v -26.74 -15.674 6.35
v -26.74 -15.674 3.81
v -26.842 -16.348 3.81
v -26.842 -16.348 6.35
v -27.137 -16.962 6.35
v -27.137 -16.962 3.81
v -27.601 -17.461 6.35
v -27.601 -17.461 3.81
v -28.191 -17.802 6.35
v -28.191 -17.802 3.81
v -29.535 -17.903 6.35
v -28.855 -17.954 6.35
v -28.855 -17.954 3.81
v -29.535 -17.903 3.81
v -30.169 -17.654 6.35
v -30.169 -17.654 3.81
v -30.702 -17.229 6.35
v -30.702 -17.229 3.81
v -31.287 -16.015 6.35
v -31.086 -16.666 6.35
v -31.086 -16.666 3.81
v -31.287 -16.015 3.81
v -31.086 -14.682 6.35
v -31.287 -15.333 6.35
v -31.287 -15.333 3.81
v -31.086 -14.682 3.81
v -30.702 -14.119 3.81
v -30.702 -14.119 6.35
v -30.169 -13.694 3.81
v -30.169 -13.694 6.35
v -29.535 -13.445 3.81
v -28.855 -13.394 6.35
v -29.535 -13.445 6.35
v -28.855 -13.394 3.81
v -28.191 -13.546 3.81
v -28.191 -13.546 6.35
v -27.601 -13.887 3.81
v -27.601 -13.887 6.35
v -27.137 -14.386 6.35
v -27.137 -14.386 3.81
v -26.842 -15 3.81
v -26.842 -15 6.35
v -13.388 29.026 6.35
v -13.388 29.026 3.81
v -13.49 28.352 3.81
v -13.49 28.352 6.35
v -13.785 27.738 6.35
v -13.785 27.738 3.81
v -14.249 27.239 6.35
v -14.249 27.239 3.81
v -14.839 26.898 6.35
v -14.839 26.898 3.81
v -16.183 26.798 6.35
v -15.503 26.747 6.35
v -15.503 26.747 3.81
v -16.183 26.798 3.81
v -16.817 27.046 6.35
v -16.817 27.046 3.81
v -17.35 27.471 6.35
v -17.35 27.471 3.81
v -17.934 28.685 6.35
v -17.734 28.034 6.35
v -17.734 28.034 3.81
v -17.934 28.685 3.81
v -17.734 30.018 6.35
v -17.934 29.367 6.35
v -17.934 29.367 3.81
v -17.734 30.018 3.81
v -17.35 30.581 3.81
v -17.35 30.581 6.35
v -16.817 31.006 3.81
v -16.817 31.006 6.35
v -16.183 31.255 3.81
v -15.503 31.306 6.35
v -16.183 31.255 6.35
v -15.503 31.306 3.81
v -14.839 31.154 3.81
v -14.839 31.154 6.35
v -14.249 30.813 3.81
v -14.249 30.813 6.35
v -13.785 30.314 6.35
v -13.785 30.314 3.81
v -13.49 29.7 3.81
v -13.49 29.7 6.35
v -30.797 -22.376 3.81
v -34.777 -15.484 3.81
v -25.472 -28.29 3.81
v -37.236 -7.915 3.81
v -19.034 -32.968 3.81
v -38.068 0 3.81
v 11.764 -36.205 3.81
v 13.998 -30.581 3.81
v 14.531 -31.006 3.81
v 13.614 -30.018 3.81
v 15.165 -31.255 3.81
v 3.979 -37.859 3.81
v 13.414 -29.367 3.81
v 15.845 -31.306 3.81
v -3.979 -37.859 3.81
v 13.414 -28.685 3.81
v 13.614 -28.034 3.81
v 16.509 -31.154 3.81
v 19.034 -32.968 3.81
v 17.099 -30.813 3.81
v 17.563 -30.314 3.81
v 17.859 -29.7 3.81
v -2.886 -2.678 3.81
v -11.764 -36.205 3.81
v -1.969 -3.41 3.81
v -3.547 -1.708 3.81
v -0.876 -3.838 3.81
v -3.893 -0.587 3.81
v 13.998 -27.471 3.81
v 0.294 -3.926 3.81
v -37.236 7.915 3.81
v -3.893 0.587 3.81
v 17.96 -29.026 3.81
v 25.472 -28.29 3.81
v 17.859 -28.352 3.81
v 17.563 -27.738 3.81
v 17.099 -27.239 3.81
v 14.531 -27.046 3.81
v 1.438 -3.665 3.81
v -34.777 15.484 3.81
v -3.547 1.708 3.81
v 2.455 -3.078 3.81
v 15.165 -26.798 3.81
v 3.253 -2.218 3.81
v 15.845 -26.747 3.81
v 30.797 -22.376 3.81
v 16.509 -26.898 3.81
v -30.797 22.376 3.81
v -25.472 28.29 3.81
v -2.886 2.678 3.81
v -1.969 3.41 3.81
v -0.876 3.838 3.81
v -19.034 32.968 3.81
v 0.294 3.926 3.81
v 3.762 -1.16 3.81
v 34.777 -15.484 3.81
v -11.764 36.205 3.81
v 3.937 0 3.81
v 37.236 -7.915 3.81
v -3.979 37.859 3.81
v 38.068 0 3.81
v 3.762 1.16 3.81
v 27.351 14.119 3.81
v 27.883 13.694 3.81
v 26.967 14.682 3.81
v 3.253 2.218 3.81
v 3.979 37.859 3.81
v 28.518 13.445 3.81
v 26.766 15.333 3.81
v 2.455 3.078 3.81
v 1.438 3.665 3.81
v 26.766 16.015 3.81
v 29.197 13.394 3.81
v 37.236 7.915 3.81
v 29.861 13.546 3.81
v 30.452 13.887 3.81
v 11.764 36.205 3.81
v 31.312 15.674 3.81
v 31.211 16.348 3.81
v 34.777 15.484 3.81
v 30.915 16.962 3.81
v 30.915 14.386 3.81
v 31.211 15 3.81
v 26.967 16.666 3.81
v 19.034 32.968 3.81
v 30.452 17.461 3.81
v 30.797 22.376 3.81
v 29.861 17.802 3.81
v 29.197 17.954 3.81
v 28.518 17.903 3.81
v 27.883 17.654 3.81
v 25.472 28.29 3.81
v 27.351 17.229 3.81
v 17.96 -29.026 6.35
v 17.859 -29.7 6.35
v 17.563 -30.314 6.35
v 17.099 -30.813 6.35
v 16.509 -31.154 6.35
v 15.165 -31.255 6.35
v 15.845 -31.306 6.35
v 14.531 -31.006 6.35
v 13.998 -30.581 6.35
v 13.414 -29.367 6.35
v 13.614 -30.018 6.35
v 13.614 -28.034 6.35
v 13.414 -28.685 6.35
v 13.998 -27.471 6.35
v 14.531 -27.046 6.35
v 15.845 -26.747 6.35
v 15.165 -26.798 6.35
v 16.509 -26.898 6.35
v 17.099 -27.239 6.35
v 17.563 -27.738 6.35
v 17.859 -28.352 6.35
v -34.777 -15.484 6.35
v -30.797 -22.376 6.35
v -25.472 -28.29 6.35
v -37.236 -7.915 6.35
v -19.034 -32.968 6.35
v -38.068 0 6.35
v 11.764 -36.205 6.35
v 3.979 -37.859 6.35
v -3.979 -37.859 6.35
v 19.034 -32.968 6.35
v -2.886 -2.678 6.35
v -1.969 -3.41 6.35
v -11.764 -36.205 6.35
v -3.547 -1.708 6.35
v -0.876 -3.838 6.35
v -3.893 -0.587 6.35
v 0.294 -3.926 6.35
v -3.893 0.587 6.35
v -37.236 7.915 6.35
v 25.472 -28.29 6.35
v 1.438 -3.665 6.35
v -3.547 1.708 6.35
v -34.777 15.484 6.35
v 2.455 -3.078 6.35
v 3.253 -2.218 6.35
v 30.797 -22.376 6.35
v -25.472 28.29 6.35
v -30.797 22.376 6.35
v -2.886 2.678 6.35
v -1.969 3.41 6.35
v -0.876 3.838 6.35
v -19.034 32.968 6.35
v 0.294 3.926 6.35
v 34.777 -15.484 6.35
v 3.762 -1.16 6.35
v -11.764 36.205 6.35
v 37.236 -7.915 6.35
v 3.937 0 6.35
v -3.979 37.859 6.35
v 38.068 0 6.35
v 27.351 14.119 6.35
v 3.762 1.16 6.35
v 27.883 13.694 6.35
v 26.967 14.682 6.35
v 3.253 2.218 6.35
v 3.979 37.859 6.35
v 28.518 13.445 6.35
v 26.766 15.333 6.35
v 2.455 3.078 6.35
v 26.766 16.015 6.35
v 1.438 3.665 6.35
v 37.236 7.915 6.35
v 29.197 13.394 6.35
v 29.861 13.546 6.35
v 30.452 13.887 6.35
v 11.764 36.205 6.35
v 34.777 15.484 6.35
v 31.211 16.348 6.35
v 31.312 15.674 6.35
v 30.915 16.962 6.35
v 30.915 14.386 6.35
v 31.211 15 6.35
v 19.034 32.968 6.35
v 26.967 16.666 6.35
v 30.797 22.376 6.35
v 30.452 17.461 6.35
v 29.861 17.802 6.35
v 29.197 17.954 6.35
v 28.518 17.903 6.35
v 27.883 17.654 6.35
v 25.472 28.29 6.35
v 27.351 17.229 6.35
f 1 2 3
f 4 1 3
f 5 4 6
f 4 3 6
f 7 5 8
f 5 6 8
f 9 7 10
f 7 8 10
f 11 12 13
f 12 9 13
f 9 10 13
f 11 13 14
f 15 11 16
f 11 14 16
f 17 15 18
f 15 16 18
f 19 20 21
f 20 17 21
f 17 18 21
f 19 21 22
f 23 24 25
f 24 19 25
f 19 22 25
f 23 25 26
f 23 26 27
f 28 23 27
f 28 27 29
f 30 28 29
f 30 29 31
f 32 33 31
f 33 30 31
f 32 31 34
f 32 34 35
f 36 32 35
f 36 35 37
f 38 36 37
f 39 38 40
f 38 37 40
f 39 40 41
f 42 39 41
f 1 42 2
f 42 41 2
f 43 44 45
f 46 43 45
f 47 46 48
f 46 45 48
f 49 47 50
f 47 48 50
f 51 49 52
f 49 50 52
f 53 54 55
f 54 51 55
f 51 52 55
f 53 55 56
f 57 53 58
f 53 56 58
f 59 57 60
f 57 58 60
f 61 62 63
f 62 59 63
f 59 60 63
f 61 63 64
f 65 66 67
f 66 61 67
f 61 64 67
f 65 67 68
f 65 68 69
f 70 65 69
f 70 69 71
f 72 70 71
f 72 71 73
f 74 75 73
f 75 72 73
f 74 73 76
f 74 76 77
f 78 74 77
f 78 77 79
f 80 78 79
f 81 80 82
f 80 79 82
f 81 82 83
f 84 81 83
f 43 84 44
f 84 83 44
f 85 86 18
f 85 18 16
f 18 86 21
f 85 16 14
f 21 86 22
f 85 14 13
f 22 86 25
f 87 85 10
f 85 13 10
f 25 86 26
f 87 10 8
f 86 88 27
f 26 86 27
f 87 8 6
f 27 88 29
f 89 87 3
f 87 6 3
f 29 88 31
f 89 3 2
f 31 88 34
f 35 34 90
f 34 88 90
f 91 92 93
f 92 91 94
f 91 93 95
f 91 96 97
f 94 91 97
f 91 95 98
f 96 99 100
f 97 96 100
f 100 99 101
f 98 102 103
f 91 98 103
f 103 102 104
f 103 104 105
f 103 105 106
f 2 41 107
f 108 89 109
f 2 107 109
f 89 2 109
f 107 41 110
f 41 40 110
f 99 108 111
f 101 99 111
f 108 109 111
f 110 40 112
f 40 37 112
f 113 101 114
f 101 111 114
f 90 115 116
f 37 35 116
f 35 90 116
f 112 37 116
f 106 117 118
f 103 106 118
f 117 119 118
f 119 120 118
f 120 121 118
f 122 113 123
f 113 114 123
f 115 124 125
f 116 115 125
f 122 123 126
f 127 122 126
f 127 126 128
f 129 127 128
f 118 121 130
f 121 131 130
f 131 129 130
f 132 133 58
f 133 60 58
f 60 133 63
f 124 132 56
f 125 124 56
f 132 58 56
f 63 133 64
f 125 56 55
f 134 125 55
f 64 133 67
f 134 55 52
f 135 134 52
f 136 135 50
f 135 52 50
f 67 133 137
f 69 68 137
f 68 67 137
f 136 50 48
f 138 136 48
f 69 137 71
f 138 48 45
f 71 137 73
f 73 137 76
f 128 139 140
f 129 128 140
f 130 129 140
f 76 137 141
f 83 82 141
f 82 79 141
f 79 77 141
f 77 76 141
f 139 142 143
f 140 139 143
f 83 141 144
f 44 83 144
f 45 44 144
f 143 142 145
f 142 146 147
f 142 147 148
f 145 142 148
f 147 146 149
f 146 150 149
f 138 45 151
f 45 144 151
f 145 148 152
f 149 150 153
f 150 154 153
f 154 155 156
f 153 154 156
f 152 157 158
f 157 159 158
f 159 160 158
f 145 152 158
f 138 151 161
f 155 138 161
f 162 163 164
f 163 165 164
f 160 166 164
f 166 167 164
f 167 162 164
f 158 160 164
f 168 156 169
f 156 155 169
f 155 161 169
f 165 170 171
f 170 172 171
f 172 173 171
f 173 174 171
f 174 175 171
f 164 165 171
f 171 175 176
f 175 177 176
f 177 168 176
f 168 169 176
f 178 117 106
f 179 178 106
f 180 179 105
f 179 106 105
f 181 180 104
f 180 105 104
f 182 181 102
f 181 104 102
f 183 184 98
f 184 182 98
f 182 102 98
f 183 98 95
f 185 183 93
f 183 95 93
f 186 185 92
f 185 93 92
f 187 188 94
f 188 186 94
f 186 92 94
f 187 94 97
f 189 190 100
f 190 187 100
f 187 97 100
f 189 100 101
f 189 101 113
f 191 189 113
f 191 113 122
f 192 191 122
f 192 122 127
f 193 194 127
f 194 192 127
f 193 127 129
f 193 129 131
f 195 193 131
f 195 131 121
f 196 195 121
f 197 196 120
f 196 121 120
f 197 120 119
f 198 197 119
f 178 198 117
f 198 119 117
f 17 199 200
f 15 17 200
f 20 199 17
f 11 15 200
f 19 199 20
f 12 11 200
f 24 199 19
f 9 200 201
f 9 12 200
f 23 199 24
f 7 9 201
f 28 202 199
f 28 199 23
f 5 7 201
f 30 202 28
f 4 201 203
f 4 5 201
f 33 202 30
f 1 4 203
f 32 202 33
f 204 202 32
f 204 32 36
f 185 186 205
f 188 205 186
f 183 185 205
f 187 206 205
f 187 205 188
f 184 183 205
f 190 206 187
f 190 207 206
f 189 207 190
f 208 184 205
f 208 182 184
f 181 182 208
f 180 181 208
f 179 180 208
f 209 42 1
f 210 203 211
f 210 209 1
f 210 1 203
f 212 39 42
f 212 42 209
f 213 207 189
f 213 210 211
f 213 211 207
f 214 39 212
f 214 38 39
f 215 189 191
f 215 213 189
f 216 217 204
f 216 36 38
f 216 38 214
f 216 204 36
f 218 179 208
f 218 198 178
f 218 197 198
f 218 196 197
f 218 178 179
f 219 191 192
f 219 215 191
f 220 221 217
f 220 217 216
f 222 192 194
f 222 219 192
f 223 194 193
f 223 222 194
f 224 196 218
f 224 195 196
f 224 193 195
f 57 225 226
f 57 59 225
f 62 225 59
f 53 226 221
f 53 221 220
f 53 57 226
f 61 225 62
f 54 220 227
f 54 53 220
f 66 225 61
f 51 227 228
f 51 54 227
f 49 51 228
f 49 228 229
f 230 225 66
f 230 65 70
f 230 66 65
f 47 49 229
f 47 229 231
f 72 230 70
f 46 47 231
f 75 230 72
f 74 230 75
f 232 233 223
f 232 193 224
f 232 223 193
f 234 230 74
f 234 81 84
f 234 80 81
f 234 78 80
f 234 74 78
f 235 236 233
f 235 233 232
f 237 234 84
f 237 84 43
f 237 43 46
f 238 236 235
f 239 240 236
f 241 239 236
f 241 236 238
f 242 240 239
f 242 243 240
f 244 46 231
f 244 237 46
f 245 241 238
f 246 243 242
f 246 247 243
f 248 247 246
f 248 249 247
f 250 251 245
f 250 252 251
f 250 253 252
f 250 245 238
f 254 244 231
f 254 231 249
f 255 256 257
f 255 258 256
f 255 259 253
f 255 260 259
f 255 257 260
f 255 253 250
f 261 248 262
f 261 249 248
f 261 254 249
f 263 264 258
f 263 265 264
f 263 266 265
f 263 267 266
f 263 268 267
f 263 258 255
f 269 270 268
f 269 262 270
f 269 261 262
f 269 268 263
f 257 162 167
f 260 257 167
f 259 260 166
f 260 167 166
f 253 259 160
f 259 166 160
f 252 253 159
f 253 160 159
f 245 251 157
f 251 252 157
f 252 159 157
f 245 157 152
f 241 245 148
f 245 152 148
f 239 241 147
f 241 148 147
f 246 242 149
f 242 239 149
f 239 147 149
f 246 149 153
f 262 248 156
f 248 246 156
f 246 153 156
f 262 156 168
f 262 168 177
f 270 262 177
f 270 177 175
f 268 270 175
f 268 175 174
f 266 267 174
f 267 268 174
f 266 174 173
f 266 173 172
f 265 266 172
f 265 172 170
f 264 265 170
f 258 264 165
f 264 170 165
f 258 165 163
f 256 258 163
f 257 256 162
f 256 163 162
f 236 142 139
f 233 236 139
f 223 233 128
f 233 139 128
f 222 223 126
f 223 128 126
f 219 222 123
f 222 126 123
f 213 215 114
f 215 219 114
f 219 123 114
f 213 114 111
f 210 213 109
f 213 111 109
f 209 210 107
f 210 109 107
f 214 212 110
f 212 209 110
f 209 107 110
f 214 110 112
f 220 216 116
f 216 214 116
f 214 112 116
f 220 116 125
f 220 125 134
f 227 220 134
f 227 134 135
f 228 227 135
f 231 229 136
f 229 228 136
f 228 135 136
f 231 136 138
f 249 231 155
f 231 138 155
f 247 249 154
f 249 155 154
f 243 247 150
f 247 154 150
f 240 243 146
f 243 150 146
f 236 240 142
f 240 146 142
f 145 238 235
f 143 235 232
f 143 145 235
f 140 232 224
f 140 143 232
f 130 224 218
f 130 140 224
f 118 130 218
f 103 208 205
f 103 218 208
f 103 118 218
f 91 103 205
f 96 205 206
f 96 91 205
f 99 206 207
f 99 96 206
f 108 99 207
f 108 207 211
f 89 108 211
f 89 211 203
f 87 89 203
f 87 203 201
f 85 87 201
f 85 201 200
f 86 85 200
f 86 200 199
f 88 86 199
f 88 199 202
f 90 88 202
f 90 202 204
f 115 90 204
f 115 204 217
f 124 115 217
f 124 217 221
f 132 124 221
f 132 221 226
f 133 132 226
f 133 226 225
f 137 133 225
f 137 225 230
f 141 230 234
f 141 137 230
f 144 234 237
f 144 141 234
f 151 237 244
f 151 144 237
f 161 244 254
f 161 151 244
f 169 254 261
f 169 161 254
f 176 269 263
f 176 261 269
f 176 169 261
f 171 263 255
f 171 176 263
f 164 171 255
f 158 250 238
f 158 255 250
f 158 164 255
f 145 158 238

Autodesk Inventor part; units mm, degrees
ref_plane "YZ Plane" through (0, 0, 0) normal (1, 0, 0) x (0, 1, 0)
ref_plane "XZ Plane" through (0, 0, 0) normal (0, 1, 0) x (-1, 0, 0)
ref_plane "Work Plane1" through (0, 0, 0) normal (0, 0, 1) x (1, 0, 0)
ref_plane "Work Plane2" through (-15.674, 29.0262, 3.81) normal (0, 0, 1) x (1, 0, 0)
sketch "Sketch2" plane through (-15.674, 29.0262, 3.81) normal (0, 0, 1) x (1, 0, 0)
  circle A0 centre (0, 0) radius 5.08 projected
  circle A1 centre (0, 0) radius 2.286 projected
  circle A2 centre (44.7003, -13.3522) radius 5.08 projected
  circle A3 centre (44.7003, -13.3522) radius 2.286 projected
  circle A4 centre (31.3481, -58.0524) radius 2.286 projected
  circle A5 centre (31.3481, -58.0524) radius 5.08 projected
  circle A6 centre (-13.3522, -44.7003) radius 2.286 projected
  circle A7 centre (-13.3522, -44.7003) radius 5.08 projected
  circle A8 centre (15.674, -29.0262) radius 38.0678
  circle A9 centre (15.674, -29.0262) radius 3.937
  dimension "d7" = 7.874
extrude "Extrusion2" add sketch "Sketch2" along normal blind 2.54 contours A0 | A7 | A5 | A2 | A8
properties part number "cover"
